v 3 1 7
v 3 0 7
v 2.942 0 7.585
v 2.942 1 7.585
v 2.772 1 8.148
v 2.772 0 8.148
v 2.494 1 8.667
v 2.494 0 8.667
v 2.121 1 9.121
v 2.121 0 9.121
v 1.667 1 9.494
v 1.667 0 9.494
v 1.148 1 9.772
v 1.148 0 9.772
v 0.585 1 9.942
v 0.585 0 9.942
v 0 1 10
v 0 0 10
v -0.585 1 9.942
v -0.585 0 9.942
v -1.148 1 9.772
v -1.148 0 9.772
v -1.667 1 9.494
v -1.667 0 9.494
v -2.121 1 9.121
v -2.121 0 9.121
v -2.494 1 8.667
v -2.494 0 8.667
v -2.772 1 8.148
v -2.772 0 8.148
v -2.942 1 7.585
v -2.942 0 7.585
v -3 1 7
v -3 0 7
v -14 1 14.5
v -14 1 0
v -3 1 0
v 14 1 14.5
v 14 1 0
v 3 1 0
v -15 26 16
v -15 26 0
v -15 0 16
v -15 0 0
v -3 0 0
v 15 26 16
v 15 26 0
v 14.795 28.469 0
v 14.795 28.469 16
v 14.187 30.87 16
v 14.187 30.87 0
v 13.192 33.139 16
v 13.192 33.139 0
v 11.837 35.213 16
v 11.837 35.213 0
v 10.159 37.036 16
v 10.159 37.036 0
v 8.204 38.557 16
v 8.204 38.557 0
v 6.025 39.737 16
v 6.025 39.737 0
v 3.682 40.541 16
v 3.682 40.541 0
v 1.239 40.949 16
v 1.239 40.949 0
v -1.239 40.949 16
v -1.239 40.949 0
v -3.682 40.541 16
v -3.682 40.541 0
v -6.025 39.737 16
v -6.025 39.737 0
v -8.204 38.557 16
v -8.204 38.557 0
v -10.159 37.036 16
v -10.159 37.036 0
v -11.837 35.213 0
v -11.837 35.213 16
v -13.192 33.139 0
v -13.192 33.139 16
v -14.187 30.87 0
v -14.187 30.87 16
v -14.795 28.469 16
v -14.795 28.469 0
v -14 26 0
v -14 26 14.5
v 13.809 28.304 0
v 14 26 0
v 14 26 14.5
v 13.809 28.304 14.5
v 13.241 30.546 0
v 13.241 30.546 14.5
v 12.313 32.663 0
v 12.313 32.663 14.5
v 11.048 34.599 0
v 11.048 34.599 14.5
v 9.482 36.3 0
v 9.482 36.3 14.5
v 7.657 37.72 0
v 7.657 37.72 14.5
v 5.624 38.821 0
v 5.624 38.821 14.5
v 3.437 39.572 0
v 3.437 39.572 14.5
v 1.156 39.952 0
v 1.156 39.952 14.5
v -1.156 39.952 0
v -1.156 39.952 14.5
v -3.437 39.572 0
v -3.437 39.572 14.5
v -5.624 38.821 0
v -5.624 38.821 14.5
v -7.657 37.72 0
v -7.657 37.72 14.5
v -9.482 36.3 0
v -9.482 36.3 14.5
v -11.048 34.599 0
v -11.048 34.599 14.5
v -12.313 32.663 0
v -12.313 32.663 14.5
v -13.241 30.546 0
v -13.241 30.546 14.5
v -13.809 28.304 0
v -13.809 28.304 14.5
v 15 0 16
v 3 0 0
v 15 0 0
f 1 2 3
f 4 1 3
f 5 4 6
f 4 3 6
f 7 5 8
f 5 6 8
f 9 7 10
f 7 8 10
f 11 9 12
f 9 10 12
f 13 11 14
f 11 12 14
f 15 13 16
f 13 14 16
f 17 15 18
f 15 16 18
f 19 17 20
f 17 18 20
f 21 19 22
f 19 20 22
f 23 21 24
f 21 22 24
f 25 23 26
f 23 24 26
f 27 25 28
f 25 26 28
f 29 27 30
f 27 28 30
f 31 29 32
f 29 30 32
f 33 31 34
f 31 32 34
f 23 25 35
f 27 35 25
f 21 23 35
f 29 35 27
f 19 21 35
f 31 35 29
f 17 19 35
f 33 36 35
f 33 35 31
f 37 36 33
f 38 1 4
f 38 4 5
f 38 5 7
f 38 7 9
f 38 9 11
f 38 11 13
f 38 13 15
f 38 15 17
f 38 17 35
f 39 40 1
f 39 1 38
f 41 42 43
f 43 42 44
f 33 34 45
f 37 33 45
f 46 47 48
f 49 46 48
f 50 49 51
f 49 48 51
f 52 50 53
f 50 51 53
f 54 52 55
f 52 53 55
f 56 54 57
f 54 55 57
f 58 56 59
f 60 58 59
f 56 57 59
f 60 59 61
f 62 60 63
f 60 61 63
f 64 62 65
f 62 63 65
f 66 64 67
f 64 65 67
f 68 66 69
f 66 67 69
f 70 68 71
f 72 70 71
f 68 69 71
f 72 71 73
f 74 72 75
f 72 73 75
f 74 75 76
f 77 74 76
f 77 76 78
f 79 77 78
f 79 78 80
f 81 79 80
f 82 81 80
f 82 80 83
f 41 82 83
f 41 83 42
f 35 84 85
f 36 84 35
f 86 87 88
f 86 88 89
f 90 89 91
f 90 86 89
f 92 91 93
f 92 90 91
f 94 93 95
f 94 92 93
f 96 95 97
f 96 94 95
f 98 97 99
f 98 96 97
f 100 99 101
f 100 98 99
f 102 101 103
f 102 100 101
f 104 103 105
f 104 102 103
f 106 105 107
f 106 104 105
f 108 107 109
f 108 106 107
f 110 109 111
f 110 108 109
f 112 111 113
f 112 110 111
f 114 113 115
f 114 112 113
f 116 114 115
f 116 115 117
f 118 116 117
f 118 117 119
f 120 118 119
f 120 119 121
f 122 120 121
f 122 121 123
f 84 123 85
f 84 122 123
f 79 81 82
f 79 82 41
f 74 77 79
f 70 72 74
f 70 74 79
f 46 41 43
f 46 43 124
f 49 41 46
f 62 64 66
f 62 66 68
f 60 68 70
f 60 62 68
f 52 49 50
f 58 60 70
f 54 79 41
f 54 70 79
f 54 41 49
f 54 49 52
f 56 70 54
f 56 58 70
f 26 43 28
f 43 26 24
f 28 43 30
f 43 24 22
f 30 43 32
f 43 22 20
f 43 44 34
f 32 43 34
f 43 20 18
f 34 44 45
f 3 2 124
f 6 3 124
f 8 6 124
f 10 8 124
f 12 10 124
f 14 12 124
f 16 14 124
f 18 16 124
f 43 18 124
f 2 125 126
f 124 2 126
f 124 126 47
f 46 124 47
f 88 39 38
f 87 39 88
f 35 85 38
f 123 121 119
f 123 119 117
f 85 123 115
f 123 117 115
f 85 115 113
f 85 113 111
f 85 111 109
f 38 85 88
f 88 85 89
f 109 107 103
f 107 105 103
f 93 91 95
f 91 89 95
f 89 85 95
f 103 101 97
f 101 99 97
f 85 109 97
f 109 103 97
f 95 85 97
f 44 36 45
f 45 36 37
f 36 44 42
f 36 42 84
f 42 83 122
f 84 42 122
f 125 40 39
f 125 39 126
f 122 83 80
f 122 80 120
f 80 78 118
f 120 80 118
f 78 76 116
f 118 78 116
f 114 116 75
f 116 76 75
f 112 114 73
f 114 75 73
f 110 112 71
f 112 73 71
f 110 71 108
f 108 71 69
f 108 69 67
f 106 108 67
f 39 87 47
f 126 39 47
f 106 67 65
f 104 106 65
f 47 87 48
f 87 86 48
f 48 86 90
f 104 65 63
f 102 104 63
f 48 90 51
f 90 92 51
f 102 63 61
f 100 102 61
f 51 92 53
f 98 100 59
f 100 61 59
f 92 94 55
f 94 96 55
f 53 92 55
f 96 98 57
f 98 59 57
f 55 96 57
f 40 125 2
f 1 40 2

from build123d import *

# Parameters (mm, degrees)
EXTRUDE_THIN1_DEPTH = 16
CUT_EXTRUDE1_DEPTH  = 10
BOSS_EXTRUDE1_START = -1.5
BOSS_EXTRUDE1_DEPTH = 1.5


with BuildPart() as part:
    # Sketch1 → Extrude-Thin1 (new body)
    with BuildSketch(Plane.XY):
        with BuildLine():
            Line((-15, 26), (-15, 0))
            Line((-15, 0), (15, 0))
            Line((15, 0), (15, 26))
            ThreePointArc((15, 26), (0, 41), (-15, 26))
        make_face()
        with BuildLine():
            Line((-14, 26), (-14, 1))
            Line((-14, 1), (14, 1))
            Line((14, 1), (14, 26))
            ThreePointArc((14, 26), (0, 40), (-14, 26))
        make_face(mode=Mode.SUBTRACT)
    extrude(amount=EXTRUDE_THIN1_DEPTH)

    # Sketch2 → Cut-Extrude1 (cut)
    with BuildSketch(Plane(origin=(0, 0, 0), x_dir=(-1, 0, 0), z_dir=(0, -1, 0))):
        with BuildLine():
            Line((3, -7), (3, 0))
            Line((3, 0), (-3, 0))
            Line((-3, 0), (-3, -7))
            ThreePointArc((-3, -7), (0, -10), (3, -7))
        make_face()
    extrude(amount=-CUT_EXTRUDE1_DEPTH, mode=Mode.SUBTRACT)

    # Sketch3 → Boss-Extrude1 (add)
    with BuildSketch(Plane.XY.offset(16).offset(BOSS_EXTRUDE1_START)):
        with BuildLine():
            Line((-15, 0), (15, 0))
            Line((15, 0), (15, 26))
            ThreePointArc((15, 26), (0, 41), (-15, 26))
            Line((-15, 26), (-15, 0))
        make_face()
    extrude(amount=BOSS_EXTRUDE1_DEPTH)


solid = part.part
